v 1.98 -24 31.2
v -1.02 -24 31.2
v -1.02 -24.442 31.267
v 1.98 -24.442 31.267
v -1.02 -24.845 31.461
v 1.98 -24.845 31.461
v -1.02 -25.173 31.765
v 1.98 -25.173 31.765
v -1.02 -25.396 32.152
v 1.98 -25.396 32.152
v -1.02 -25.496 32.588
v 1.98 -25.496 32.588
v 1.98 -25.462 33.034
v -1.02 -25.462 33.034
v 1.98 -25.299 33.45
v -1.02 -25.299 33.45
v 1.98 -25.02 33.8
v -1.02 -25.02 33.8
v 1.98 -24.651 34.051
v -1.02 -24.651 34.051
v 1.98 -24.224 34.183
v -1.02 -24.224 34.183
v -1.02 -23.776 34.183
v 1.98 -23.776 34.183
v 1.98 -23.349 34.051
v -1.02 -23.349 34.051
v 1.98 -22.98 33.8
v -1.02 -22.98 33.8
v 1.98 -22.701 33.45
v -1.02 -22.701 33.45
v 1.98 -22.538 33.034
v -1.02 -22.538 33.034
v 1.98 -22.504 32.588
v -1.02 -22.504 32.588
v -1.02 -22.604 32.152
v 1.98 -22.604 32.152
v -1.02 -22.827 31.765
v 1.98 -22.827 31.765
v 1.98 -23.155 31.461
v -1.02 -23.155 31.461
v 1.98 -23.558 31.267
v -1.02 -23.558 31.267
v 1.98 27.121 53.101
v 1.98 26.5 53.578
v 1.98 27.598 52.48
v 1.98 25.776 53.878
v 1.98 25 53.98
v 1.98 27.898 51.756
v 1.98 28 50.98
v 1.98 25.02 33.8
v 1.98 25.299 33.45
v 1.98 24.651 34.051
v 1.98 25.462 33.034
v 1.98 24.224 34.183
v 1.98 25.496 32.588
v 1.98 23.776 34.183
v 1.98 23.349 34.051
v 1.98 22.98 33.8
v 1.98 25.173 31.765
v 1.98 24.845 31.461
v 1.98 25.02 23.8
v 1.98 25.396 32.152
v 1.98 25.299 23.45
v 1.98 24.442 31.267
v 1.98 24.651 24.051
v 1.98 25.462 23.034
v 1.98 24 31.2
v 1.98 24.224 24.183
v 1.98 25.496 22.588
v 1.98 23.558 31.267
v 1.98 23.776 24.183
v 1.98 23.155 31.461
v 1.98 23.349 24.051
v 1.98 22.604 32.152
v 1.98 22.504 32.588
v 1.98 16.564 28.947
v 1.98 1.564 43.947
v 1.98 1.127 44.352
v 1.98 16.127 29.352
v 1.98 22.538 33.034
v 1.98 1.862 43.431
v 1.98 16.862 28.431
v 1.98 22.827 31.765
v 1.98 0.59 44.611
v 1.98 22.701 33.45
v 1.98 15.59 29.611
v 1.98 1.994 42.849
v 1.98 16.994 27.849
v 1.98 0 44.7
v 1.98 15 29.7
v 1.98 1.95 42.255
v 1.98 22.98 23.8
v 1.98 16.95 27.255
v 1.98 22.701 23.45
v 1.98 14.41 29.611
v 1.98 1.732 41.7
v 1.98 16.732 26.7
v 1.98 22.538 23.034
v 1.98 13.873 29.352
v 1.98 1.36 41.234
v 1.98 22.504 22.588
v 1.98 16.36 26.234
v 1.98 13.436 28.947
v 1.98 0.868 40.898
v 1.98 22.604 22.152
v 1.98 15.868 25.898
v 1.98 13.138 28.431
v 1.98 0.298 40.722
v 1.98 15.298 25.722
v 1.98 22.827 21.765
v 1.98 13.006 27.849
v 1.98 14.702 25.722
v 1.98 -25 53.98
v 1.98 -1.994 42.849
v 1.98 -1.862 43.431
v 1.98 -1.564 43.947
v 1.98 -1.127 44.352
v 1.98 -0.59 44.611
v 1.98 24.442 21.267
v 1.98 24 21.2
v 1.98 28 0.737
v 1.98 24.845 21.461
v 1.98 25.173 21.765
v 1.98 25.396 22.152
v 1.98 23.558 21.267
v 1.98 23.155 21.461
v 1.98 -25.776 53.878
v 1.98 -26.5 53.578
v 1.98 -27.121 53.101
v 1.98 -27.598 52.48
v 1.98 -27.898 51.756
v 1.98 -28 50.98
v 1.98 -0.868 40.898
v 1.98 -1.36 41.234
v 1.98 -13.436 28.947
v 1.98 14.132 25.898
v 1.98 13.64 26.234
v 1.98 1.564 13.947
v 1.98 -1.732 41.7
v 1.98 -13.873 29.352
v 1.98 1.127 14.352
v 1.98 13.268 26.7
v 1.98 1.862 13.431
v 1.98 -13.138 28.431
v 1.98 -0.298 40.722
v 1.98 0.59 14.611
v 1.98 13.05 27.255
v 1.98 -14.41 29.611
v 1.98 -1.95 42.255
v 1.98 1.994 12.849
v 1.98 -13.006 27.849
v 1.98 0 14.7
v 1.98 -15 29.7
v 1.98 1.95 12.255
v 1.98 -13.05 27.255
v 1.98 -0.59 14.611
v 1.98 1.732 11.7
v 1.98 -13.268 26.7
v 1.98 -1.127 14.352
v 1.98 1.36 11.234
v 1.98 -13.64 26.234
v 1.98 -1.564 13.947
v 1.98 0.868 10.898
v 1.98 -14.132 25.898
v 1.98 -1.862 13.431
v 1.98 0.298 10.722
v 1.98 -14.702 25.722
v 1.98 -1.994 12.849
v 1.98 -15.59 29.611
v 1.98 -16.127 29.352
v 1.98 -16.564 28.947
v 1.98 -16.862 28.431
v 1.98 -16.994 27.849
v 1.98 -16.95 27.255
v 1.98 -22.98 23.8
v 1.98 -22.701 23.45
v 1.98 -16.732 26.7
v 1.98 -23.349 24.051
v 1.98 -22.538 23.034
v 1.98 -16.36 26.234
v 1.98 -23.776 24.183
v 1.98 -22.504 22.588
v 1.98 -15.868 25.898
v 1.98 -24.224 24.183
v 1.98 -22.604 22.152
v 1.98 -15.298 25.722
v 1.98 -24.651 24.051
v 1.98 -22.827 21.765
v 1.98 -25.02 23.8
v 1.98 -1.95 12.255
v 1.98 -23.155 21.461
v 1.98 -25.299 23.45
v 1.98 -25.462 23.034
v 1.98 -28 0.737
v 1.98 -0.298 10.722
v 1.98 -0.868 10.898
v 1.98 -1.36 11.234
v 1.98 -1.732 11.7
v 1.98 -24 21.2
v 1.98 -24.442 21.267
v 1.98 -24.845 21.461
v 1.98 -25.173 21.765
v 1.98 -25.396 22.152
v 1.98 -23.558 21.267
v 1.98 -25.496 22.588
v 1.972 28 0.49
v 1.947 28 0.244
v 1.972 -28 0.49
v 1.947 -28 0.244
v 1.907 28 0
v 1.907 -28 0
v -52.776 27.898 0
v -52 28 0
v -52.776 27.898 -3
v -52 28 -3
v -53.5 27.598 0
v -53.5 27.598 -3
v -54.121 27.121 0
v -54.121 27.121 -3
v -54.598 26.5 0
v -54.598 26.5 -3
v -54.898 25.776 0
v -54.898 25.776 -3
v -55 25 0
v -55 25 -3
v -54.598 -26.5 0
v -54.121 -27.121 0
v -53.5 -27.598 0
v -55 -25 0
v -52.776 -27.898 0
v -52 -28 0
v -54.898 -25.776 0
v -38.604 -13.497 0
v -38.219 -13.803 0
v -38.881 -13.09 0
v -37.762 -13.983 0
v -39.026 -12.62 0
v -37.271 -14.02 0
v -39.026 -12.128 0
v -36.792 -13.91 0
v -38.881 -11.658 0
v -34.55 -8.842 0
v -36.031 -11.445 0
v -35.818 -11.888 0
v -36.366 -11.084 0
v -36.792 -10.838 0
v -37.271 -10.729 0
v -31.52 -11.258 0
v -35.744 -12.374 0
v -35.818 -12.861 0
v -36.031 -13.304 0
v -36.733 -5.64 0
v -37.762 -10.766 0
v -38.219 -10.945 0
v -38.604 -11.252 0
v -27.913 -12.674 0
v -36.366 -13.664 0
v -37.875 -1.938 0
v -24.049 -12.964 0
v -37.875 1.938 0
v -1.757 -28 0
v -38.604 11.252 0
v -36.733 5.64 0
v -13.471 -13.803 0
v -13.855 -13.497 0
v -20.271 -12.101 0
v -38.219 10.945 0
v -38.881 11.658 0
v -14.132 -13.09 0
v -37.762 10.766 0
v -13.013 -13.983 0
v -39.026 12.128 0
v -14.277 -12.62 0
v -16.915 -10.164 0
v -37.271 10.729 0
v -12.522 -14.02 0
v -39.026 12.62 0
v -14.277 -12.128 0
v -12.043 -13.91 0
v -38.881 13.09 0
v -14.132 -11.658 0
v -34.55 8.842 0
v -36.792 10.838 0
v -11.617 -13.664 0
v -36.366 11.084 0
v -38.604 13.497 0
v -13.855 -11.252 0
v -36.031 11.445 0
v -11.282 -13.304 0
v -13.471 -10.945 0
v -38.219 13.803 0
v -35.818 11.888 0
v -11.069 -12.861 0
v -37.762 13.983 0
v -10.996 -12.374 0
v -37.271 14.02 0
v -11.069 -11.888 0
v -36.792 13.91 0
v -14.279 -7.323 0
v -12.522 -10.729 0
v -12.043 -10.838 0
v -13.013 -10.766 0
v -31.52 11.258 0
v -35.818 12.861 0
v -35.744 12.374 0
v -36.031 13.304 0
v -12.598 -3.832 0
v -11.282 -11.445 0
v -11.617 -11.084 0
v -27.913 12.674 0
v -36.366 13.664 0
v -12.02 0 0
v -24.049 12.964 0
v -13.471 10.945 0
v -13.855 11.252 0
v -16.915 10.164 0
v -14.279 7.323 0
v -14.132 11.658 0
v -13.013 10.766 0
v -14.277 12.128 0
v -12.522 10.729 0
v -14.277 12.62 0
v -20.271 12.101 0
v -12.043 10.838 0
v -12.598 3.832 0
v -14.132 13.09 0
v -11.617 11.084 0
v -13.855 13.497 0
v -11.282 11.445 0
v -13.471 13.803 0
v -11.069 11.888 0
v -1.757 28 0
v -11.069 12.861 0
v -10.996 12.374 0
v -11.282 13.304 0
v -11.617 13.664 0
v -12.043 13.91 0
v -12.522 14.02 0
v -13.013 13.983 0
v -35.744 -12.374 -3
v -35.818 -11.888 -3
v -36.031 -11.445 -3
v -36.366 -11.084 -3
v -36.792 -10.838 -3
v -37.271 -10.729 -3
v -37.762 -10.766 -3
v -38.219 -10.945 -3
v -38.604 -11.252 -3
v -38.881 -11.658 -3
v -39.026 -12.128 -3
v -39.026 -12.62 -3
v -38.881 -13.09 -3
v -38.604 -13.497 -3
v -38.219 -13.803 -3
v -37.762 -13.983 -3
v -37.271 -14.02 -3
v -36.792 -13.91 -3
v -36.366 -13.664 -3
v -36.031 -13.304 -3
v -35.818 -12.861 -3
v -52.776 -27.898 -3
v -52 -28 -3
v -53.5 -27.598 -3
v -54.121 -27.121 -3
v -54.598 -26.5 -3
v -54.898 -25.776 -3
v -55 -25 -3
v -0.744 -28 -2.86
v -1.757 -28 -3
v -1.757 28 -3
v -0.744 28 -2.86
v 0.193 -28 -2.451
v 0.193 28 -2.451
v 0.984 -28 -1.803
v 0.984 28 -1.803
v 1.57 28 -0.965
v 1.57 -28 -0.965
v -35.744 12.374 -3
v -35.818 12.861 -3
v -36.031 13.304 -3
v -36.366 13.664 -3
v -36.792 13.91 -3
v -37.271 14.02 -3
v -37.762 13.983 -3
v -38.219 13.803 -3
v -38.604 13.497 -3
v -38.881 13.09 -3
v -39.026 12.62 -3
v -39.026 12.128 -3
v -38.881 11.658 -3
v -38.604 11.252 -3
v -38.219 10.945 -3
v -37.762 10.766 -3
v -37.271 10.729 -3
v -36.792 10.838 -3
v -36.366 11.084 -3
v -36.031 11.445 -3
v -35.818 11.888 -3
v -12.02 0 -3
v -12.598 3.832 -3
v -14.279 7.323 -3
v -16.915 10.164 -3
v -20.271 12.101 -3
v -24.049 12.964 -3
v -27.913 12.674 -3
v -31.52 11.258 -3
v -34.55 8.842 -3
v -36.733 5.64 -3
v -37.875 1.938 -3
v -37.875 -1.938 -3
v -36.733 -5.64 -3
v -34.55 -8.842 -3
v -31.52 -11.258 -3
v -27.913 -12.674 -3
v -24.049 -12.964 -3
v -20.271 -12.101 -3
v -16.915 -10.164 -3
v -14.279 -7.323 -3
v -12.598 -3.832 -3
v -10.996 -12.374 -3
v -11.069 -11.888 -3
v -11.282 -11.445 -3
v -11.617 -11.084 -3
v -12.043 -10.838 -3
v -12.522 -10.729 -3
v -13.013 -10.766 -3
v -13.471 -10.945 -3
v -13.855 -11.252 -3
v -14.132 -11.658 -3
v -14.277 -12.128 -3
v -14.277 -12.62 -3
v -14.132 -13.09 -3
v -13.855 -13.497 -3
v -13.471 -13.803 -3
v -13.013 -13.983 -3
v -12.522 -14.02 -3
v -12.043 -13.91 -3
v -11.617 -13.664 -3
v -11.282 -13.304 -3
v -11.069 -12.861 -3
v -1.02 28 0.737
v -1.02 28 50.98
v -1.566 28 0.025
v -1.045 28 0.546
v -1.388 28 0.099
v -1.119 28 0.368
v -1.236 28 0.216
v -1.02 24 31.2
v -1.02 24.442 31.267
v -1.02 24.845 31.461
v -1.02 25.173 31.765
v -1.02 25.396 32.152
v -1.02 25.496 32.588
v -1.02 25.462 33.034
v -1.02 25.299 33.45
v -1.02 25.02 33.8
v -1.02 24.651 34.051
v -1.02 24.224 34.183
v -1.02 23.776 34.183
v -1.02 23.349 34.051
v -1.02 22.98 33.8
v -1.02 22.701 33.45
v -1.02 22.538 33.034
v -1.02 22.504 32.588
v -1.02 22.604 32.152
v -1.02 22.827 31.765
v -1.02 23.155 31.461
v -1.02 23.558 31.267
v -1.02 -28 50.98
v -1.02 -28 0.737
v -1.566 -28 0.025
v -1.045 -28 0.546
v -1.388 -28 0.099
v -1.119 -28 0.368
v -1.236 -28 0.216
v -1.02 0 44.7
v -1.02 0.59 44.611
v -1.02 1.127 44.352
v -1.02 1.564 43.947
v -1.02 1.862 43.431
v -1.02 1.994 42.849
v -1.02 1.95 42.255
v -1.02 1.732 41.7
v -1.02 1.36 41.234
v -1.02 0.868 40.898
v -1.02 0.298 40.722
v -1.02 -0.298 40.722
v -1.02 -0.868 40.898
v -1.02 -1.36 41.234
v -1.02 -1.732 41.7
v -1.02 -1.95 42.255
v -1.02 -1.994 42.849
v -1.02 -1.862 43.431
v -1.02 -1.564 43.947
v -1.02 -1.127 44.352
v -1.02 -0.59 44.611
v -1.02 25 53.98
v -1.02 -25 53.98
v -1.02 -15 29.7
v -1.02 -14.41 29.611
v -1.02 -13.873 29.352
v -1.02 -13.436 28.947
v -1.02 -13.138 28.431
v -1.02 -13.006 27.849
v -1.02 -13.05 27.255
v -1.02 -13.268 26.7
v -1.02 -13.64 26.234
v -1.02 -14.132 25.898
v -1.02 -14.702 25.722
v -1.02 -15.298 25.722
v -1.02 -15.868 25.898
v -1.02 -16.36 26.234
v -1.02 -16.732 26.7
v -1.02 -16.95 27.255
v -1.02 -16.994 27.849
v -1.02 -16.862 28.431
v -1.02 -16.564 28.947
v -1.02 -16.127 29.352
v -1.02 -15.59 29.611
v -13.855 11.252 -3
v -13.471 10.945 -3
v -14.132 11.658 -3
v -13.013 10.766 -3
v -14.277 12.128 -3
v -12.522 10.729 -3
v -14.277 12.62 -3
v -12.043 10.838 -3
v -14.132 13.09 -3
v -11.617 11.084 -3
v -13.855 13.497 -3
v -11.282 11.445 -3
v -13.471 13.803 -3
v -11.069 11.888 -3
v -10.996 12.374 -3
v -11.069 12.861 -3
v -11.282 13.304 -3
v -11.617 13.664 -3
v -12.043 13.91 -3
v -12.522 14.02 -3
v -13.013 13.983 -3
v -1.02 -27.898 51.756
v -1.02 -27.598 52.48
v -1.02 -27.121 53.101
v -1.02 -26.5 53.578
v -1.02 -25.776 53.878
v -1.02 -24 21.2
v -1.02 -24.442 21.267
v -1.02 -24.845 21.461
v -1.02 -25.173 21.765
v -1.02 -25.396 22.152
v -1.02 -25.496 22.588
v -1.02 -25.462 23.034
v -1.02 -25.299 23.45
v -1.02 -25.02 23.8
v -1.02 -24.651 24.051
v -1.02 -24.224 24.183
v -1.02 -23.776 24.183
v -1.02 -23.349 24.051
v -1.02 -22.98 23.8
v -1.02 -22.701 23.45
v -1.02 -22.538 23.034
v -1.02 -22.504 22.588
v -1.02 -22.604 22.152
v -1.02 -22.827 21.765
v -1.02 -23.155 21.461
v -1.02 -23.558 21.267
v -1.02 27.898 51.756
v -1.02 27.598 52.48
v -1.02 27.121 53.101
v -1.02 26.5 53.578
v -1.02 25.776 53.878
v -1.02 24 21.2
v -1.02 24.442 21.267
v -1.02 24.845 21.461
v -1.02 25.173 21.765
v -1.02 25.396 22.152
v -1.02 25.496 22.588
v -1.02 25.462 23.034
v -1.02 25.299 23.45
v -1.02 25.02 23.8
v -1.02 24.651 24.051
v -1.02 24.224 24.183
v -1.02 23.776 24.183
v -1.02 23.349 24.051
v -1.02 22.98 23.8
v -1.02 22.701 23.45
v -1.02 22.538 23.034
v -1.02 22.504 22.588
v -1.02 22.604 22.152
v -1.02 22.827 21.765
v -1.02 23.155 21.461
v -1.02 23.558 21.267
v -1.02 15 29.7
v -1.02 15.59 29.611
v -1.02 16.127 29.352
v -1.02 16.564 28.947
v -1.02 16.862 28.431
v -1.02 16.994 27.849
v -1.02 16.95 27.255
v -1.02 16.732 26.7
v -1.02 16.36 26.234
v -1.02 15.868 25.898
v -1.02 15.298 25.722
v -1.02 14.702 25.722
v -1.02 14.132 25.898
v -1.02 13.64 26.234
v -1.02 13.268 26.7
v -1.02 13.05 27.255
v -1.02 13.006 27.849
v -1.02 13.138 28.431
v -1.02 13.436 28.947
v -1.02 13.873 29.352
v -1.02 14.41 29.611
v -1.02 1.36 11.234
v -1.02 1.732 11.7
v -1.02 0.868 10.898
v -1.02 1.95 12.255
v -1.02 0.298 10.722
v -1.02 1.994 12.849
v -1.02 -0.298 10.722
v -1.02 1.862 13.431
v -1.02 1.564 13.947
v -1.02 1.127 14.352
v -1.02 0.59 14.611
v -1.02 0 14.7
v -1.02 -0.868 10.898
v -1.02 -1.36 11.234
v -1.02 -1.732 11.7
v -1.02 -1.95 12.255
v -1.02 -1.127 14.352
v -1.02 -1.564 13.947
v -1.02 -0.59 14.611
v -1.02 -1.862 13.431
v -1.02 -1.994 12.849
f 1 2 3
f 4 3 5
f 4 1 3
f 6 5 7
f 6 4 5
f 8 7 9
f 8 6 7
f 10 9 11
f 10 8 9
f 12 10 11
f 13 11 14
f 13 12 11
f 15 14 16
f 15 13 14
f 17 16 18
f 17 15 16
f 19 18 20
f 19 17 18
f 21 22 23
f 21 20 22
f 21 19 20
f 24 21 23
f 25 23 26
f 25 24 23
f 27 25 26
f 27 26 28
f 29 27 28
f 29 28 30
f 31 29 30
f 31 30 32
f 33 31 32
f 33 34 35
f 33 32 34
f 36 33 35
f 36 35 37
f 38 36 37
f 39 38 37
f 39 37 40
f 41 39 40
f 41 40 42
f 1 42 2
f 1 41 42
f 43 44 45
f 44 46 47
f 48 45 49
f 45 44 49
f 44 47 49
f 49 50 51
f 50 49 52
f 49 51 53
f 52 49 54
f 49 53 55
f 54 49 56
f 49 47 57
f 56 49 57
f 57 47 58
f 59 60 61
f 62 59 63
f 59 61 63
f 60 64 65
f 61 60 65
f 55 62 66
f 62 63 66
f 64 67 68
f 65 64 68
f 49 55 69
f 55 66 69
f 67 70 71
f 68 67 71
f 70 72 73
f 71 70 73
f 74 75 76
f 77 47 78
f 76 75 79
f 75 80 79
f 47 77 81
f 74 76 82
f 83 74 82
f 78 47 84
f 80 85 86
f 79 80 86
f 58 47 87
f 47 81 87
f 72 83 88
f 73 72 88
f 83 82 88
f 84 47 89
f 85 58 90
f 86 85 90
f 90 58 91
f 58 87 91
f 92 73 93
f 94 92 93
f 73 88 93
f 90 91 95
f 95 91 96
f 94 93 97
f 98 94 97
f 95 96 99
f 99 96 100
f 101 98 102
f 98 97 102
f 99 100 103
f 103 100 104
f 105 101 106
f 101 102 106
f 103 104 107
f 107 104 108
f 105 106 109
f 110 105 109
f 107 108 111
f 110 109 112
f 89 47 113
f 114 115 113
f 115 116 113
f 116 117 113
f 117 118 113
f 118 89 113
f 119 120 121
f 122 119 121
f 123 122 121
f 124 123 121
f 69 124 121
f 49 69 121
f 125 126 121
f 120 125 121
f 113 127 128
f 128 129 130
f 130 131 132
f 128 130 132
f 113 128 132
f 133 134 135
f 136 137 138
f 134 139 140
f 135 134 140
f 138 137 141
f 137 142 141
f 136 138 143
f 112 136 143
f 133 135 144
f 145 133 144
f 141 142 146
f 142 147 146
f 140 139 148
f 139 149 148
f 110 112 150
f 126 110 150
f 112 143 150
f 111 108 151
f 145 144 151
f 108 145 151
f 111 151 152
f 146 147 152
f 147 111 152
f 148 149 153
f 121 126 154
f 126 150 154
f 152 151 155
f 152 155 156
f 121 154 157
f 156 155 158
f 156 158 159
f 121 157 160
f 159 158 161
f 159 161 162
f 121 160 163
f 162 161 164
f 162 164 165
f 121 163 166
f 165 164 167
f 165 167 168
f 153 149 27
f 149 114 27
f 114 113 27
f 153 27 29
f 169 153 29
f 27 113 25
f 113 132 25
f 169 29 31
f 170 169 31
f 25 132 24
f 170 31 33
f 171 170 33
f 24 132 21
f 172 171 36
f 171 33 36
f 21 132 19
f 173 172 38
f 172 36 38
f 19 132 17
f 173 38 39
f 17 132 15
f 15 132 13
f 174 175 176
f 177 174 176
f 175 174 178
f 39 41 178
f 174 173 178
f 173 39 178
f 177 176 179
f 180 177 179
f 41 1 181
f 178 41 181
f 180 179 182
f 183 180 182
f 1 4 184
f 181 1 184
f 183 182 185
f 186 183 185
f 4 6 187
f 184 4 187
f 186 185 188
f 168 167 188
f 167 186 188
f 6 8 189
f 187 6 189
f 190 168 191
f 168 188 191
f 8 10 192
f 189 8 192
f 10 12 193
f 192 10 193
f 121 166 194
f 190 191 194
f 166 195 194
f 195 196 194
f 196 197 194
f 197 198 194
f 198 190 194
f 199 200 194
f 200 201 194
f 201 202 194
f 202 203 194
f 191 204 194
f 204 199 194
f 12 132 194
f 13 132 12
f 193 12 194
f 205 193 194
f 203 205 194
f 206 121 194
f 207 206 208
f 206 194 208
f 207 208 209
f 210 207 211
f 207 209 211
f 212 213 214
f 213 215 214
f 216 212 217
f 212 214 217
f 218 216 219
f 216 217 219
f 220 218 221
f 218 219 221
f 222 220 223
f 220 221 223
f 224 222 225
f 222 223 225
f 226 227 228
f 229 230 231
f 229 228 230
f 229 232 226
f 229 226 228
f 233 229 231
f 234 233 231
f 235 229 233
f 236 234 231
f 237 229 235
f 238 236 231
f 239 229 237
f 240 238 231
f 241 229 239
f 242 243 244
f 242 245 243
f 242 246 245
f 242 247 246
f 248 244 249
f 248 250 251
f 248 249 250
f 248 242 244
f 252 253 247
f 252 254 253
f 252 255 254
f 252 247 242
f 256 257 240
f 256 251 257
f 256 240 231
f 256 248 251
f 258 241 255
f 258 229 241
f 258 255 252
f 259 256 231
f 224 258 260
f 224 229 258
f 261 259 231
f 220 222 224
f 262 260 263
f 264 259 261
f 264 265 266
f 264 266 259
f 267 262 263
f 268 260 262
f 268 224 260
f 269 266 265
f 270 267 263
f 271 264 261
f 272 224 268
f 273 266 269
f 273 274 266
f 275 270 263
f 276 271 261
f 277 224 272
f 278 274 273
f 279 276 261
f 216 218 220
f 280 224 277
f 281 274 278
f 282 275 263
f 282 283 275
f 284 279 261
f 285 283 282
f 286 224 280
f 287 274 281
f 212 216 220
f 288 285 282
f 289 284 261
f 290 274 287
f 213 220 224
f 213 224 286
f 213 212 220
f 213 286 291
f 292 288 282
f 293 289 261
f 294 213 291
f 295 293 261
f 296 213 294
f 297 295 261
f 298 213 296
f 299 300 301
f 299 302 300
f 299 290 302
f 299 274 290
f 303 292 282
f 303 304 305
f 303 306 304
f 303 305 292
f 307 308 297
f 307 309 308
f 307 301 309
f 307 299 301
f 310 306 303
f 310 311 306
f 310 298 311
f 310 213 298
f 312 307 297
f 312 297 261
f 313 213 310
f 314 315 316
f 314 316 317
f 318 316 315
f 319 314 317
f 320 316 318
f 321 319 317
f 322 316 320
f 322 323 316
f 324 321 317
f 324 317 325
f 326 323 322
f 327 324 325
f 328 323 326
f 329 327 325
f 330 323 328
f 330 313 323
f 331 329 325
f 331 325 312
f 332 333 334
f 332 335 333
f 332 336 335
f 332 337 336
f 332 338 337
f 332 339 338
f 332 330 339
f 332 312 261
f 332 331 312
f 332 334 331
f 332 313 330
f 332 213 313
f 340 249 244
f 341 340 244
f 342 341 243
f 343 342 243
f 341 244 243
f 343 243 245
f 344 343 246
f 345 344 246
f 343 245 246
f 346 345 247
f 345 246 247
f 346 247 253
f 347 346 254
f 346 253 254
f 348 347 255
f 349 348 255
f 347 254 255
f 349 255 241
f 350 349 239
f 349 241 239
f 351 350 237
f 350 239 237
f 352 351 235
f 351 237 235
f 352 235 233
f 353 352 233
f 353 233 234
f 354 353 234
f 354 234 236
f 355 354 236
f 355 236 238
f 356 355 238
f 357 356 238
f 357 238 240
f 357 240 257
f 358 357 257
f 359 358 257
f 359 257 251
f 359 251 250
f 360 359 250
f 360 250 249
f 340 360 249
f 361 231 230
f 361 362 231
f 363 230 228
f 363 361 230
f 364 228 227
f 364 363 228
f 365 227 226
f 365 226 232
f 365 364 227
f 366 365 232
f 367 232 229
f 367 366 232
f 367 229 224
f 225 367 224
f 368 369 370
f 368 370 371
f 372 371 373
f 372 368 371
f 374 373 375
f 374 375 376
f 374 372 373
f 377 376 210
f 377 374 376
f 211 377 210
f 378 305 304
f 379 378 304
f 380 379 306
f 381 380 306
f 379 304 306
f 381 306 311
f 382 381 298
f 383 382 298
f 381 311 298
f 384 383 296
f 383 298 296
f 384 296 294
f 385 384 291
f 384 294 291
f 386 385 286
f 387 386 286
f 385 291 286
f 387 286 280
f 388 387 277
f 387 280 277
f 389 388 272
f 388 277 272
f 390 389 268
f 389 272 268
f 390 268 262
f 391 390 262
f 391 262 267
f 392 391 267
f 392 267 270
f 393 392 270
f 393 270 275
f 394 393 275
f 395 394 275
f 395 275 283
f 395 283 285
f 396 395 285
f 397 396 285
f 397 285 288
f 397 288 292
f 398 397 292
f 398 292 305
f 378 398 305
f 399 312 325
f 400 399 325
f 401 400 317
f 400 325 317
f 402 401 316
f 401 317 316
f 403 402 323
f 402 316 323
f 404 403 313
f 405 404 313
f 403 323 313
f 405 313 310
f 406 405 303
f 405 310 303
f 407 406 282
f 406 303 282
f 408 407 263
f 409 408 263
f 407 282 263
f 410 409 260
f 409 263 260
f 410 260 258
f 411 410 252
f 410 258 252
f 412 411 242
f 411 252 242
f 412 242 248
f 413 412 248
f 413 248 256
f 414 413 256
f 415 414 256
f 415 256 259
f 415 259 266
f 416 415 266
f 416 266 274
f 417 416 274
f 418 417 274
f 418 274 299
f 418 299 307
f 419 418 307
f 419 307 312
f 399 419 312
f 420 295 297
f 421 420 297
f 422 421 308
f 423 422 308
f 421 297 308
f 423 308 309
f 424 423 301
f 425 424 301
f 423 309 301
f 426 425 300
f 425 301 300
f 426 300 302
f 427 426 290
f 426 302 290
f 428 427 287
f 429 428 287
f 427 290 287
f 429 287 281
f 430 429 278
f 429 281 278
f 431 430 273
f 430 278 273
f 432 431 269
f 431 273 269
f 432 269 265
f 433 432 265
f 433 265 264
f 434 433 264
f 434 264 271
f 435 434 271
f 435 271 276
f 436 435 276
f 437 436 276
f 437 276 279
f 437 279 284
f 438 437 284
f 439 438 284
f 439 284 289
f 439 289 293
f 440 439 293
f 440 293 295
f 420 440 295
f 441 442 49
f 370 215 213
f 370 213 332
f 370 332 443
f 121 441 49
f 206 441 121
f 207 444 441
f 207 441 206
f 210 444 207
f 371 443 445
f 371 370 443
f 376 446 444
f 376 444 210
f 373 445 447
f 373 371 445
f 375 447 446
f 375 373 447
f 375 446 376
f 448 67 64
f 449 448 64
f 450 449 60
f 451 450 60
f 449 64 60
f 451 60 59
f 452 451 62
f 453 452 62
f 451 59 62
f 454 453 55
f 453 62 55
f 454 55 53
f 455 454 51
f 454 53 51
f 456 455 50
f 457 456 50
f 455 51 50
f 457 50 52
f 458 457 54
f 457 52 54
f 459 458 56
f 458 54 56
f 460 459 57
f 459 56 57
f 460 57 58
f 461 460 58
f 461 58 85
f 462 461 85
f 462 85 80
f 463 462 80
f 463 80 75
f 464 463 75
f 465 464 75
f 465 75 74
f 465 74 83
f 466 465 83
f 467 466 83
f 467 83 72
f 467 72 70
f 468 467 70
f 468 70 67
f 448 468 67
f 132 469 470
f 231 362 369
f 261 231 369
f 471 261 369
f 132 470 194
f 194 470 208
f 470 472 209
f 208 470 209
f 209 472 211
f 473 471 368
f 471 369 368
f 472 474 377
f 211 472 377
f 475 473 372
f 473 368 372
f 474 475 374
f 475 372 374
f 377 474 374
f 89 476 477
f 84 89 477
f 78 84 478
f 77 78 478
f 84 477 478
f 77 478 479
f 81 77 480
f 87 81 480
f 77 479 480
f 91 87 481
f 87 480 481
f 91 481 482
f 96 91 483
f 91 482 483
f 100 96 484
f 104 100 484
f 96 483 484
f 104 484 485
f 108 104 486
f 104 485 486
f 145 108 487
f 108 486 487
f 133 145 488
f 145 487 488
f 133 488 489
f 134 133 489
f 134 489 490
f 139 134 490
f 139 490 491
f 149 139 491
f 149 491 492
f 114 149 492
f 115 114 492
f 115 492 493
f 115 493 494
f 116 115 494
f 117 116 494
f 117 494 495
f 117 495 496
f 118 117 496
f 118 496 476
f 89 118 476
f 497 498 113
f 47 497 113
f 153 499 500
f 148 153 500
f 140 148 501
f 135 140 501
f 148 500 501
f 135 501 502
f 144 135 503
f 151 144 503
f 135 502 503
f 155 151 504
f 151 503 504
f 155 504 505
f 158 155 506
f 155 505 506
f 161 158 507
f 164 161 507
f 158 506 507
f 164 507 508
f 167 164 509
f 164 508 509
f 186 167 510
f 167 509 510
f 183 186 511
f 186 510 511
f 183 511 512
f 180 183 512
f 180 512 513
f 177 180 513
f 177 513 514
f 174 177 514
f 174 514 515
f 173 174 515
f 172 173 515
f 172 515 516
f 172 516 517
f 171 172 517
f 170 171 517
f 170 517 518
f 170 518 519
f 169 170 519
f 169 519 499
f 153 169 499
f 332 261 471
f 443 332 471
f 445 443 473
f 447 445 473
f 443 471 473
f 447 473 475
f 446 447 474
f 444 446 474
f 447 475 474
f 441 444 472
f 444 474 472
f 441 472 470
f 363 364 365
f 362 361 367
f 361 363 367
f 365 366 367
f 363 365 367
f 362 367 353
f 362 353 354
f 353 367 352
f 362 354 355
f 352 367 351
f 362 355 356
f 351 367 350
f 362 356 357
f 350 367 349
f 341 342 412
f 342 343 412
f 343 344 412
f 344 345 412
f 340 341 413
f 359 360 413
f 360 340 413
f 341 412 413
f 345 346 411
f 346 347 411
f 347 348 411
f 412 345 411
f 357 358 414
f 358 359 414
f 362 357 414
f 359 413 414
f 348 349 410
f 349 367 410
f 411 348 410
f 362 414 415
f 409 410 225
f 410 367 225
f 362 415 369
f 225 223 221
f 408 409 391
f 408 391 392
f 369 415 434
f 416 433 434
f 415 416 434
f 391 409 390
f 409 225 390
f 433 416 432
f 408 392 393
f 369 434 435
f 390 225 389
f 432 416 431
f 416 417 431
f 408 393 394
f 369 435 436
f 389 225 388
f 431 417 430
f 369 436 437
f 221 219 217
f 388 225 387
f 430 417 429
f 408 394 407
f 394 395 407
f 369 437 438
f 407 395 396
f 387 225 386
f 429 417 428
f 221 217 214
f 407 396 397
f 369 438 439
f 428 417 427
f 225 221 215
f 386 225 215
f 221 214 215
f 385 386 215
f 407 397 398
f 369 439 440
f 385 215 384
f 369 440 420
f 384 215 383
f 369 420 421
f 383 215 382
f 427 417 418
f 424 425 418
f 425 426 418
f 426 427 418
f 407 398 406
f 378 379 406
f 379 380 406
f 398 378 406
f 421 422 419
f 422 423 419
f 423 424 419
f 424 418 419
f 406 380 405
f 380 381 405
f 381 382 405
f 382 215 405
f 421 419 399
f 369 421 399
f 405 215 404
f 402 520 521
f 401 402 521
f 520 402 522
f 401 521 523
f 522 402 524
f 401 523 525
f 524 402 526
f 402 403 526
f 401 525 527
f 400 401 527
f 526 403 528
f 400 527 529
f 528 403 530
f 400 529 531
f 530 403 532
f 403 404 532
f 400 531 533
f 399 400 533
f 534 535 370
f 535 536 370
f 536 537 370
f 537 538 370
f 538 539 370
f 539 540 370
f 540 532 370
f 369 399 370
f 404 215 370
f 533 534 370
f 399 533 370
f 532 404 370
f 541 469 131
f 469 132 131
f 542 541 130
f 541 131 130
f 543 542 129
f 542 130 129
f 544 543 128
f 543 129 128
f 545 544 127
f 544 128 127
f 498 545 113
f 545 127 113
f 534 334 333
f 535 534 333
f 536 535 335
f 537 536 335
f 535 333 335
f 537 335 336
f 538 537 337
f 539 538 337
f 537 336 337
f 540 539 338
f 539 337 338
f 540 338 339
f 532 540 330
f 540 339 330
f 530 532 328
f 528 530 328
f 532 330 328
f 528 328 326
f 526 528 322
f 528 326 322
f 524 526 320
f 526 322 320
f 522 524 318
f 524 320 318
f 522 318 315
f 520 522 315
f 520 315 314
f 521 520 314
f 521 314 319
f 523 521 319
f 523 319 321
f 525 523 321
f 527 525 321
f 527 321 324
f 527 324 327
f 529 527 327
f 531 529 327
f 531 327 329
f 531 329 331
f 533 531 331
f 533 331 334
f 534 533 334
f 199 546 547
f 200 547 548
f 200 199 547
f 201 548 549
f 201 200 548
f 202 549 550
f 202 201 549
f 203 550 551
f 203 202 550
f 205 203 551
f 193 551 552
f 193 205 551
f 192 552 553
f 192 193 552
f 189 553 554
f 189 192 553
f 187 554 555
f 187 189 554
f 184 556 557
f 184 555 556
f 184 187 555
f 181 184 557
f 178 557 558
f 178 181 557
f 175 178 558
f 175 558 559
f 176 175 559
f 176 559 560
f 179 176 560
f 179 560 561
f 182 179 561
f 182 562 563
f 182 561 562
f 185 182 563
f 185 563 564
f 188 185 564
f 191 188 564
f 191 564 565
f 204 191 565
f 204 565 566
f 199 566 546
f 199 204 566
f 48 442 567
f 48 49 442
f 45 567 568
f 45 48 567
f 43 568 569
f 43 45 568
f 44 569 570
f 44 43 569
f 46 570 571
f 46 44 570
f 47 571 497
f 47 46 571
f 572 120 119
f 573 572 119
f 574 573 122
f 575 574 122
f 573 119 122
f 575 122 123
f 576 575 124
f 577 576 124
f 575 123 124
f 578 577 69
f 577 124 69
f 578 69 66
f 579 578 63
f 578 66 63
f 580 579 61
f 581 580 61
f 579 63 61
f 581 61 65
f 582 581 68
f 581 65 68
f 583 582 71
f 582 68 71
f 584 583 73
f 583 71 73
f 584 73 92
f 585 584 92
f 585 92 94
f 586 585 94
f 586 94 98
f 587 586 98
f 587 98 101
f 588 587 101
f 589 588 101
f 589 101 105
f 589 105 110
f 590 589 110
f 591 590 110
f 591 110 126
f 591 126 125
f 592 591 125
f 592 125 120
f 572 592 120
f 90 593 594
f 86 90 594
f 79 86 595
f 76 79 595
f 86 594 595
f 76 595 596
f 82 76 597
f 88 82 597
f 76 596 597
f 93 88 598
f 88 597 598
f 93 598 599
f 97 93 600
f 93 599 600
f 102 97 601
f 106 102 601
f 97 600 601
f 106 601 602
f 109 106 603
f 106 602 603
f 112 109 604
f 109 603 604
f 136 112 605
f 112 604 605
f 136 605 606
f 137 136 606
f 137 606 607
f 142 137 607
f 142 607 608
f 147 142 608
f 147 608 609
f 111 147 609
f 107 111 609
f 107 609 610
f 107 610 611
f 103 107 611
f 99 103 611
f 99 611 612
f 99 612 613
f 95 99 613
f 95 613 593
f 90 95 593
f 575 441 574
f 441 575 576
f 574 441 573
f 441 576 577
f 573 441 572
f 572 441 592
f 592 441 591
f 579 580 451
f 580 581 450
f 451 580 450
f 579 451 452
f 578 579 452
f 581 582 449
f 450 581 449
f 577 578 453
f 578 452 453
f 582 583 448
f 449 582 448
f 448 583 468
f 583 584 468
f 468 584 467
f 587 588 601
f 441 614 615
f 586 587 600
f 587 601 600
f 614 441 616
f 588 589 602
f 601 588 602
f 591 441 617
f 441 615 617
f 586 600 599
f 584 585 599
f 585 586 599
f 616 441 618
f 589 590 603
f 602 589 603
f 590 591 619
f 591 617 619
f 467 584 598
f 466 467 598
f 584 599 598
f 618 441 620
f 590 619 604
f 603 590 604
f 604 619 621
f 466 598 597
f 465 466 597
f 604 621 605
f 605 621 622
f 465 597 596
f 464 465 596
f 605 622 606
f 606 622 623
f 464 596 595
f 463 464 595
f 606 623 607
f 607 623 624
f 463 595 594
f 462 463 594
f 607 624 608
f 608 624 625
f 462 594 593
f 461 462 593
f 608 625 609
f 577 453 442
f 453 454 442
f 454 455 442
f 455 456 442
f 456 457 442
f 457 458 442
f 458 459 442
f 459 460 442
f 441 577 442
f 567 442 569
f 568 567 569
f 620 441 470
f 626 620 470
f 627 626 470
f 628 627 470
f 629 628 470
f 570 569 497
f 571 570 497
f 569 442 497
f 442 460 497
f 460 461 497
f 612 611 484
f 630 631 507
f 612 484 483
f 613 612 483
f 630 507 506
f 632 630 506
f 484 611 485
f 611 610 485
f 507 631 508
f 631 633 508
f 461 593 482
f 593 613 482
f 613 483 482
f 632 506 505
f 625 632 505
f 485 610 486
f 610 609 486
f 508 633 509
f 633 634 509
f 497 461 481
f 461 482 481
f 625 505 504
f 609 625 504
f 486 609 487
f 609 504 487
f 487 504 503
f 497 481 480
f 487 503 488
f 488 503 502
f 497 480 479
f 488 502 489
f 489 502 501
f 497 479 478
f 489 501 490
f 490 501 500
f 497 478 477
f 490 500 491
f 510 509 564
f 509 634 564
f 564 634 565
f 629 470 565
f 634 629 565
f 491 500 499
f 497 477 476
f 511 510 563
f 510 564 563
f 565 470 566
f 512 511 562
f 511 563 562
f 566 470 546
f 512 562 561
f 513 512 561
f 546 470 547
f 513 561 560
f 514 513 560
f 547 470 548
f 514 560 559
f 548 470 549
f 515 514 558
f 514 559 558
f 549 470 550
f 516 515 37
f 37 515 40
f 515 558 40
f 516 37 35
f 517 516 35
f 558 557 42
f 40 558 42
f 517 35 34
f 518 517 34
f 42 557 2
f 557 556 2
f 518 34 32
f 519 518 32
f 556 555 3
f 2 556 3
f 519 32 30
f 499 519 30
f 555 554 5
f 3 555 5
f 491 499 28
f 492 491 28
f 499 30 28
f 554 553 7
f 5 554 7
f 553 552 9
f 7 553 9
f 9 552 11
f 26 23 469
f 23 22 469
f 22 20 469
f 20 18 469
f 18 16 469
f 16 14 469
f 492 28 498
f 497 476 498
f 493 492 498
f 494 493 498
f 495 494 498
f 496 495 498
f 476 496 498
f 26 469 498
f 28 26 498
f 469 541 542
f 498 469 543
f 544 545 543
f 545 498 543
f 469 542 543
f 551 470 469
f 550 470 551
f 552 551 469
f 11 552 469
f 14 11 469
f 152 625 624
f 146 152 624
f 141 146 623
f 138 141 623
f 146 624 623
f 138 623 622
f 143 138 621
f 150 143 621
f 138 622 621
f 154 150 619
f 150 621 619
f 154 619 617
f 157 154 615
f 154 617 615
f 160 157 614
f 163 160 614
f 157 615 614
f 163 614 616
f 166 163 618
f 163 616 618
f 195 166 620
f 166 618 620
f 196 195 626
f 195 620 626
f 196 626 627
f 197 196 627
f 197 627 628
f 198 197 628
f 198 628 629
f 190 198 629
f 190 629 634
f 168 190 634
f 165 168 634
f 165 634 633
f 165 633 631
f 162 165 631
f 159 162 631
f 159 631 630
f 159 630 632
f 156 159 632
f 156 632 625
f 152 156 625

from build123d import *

# Parameters (mm, degrees)
SKETCH_2_W             = 110
SKETCH_2_H             = 56
SM_BASE_FLANGE_1_DEPTH = 3
OTHER_START            = -28
OTHER_1_DEPTH          = 56
OTHER_1_2_DEPTH        = 56
SKETCH_8_R             = 2
CUT_EXTRUDE_1_DEPTH    = 10
FILLET_1_R             = 3
SKETCH_9_R             = 13
CUT_EXTRUDE_2_DEPTH    = 10
SKETCH_10_R            = 1.65
CUT_EXTRUDE_3_DEPTH    = 82.992914788
SKETCH_11_R            = 1.5
CUT_EXTRUDE_4_DEPTH    = 10


# Read off the part's stored shape, not the designer's step: 绘制的折弯1
# Sheet-metal steps are written as plain solids
with BuildPart() as part:
    # Sketch 2 → 基体-法兰1 (new body)
    with BuildSketch(Plane.XY):
        Rectangle(SKETCH_2_W, SKETCH_2_H)
    extrude(amount=-SM_BASE_FLANGE_1_DEPTH)

    # Other 1 outline → Other 1 (cut)
    with BuildSketch(Plane(origin=(0, 0, 0), x_dir=(1, 0, 0), z_dir=(0, 1, 0)).offset(OTHER_START)):
        with BuildLine():
            ThreePointArc((-1.756621532, 3), (0.610845469, 2.154295979), (1.906655689, 0))
            Line((1.906655689, 0), (55, 0))
            Line((55, 0), (55, 3))
            Line((55, 3), (-1.756621532, 3))
        make_face()
    extrude(amount=OTHER_1_DEPTH, mode=Mode.SUBTRACT)

    # Other 1 2 outline → Other 1 2 (add)
    with BuildSketch(Plane(origin=(0, 0, 0), x_dir=(1, 0, 0), z_dir=(0, 1, 0)).offset(OTHER_START)):
        with BuildLine():
            Line((-1.020021532, -0.7366), (-1.020021532, -53.979978468))
            Line((-1.020021532, -53.979978468), (1.979978468, -53.979978468))
            Line((1.979978468, -53.979978468), (1.979978468, -0.7366))
            ThreePointArc((1.979978468, -0.7366), (1.961602589, -0.36647982), (1.906655689, 0))
            Line((1.906655689, 0), (-1.756621532, 0))
            ThreePointArc((-1.756621532, 0), (-1.235766677, -0.215745145), (-1.020021532, -0.7366))
        make_face()
    extrude(amount=OTHER_1_2_DEPTH)

    # 草图8 → 切除-拉伸1 (cut)
    with BuildSketch(Plane.ZY.offset(1.020021532)):
        with Locations((12.7, 0)):
            Circle(SKETCH_8_R)
        with Locations((42.7, 0)):
            Circle(SKETCH_8_R)
        with Locations((27.7, 15)):
            Circle(SKETCH_8_R)
        with Locations((27.7, -15)):
            Circle(SKETCH_8_R)
    extrude(amount=-CUT_EXTRUDE_1_DEPTH, mode=Mode.SUBTRACT)

    # 圆角1
    fillet_1_edges = [part.edges().sort_by_distance(p)[0] for p in [
        (-55, -28, -1.5),
        (-55, 28, -1.5),
        (0.479978468, -28, 53.979978468),
        (0.479978468, 28, 53.979978468),
    ]]
    fillet(fillet_1_edges, radius=FILLET_1_R)

    # 草图9 → 切除-拉伸2 (cut)
    with BuildSketch(Plane.XY):
        with Locations((-25.020021532, 0)):
            Circle(SKETCH_9_R)
    extrude(amount=-CUT_EXTRUDE_2_DEPTH, mode=Mode.SUBTRACT)

    # 草图10 → 切除-拉伸3 (cut, through all)
    with BuildSketch(Plane.XY):
        with Locations((-12.645652861, 12.374368671)):
            Circle(SKETCH_10_R)
        with Locations((-12.645652861, -12.374368671)):
            Circle(SKETCH_10_R)
        with Locations((-37.394390203, -12.374368671)):
            Circle(SKETCH_10_R)
        with Locations((-37.394390203, 12.374368671)):
            Circle(SKETCH_10_R)
    extrude(amount=-CUT_EXTRUDE_3_DEPTH, mode=Mode.SUBTRACT)

    # 草图11 → 切除-拉伸4 (cut)
    with BuildSketch(Plane(origin=(1.979978468, 0, 0), x_dir=(0, 0, -1), z_dir=(1, 0, 0))):
        with Locations((-32.7, 24)):
            Circle(SKETCH_11_R)
        with Locations((-22.7, 24)):
            Circle(SKETCH_11_R)
    cut_extrude_4 = extrude(amount=-CUT_EXTRUDE_4_DEPTH, mode=Mode.SUBTRACT)

    # 镜向1: 切除-拉伸4 across plane
    add(cut_extrude_4.mirror(Plane.ZX), mode=Mode.SUBTRACT)


solid = part.part
